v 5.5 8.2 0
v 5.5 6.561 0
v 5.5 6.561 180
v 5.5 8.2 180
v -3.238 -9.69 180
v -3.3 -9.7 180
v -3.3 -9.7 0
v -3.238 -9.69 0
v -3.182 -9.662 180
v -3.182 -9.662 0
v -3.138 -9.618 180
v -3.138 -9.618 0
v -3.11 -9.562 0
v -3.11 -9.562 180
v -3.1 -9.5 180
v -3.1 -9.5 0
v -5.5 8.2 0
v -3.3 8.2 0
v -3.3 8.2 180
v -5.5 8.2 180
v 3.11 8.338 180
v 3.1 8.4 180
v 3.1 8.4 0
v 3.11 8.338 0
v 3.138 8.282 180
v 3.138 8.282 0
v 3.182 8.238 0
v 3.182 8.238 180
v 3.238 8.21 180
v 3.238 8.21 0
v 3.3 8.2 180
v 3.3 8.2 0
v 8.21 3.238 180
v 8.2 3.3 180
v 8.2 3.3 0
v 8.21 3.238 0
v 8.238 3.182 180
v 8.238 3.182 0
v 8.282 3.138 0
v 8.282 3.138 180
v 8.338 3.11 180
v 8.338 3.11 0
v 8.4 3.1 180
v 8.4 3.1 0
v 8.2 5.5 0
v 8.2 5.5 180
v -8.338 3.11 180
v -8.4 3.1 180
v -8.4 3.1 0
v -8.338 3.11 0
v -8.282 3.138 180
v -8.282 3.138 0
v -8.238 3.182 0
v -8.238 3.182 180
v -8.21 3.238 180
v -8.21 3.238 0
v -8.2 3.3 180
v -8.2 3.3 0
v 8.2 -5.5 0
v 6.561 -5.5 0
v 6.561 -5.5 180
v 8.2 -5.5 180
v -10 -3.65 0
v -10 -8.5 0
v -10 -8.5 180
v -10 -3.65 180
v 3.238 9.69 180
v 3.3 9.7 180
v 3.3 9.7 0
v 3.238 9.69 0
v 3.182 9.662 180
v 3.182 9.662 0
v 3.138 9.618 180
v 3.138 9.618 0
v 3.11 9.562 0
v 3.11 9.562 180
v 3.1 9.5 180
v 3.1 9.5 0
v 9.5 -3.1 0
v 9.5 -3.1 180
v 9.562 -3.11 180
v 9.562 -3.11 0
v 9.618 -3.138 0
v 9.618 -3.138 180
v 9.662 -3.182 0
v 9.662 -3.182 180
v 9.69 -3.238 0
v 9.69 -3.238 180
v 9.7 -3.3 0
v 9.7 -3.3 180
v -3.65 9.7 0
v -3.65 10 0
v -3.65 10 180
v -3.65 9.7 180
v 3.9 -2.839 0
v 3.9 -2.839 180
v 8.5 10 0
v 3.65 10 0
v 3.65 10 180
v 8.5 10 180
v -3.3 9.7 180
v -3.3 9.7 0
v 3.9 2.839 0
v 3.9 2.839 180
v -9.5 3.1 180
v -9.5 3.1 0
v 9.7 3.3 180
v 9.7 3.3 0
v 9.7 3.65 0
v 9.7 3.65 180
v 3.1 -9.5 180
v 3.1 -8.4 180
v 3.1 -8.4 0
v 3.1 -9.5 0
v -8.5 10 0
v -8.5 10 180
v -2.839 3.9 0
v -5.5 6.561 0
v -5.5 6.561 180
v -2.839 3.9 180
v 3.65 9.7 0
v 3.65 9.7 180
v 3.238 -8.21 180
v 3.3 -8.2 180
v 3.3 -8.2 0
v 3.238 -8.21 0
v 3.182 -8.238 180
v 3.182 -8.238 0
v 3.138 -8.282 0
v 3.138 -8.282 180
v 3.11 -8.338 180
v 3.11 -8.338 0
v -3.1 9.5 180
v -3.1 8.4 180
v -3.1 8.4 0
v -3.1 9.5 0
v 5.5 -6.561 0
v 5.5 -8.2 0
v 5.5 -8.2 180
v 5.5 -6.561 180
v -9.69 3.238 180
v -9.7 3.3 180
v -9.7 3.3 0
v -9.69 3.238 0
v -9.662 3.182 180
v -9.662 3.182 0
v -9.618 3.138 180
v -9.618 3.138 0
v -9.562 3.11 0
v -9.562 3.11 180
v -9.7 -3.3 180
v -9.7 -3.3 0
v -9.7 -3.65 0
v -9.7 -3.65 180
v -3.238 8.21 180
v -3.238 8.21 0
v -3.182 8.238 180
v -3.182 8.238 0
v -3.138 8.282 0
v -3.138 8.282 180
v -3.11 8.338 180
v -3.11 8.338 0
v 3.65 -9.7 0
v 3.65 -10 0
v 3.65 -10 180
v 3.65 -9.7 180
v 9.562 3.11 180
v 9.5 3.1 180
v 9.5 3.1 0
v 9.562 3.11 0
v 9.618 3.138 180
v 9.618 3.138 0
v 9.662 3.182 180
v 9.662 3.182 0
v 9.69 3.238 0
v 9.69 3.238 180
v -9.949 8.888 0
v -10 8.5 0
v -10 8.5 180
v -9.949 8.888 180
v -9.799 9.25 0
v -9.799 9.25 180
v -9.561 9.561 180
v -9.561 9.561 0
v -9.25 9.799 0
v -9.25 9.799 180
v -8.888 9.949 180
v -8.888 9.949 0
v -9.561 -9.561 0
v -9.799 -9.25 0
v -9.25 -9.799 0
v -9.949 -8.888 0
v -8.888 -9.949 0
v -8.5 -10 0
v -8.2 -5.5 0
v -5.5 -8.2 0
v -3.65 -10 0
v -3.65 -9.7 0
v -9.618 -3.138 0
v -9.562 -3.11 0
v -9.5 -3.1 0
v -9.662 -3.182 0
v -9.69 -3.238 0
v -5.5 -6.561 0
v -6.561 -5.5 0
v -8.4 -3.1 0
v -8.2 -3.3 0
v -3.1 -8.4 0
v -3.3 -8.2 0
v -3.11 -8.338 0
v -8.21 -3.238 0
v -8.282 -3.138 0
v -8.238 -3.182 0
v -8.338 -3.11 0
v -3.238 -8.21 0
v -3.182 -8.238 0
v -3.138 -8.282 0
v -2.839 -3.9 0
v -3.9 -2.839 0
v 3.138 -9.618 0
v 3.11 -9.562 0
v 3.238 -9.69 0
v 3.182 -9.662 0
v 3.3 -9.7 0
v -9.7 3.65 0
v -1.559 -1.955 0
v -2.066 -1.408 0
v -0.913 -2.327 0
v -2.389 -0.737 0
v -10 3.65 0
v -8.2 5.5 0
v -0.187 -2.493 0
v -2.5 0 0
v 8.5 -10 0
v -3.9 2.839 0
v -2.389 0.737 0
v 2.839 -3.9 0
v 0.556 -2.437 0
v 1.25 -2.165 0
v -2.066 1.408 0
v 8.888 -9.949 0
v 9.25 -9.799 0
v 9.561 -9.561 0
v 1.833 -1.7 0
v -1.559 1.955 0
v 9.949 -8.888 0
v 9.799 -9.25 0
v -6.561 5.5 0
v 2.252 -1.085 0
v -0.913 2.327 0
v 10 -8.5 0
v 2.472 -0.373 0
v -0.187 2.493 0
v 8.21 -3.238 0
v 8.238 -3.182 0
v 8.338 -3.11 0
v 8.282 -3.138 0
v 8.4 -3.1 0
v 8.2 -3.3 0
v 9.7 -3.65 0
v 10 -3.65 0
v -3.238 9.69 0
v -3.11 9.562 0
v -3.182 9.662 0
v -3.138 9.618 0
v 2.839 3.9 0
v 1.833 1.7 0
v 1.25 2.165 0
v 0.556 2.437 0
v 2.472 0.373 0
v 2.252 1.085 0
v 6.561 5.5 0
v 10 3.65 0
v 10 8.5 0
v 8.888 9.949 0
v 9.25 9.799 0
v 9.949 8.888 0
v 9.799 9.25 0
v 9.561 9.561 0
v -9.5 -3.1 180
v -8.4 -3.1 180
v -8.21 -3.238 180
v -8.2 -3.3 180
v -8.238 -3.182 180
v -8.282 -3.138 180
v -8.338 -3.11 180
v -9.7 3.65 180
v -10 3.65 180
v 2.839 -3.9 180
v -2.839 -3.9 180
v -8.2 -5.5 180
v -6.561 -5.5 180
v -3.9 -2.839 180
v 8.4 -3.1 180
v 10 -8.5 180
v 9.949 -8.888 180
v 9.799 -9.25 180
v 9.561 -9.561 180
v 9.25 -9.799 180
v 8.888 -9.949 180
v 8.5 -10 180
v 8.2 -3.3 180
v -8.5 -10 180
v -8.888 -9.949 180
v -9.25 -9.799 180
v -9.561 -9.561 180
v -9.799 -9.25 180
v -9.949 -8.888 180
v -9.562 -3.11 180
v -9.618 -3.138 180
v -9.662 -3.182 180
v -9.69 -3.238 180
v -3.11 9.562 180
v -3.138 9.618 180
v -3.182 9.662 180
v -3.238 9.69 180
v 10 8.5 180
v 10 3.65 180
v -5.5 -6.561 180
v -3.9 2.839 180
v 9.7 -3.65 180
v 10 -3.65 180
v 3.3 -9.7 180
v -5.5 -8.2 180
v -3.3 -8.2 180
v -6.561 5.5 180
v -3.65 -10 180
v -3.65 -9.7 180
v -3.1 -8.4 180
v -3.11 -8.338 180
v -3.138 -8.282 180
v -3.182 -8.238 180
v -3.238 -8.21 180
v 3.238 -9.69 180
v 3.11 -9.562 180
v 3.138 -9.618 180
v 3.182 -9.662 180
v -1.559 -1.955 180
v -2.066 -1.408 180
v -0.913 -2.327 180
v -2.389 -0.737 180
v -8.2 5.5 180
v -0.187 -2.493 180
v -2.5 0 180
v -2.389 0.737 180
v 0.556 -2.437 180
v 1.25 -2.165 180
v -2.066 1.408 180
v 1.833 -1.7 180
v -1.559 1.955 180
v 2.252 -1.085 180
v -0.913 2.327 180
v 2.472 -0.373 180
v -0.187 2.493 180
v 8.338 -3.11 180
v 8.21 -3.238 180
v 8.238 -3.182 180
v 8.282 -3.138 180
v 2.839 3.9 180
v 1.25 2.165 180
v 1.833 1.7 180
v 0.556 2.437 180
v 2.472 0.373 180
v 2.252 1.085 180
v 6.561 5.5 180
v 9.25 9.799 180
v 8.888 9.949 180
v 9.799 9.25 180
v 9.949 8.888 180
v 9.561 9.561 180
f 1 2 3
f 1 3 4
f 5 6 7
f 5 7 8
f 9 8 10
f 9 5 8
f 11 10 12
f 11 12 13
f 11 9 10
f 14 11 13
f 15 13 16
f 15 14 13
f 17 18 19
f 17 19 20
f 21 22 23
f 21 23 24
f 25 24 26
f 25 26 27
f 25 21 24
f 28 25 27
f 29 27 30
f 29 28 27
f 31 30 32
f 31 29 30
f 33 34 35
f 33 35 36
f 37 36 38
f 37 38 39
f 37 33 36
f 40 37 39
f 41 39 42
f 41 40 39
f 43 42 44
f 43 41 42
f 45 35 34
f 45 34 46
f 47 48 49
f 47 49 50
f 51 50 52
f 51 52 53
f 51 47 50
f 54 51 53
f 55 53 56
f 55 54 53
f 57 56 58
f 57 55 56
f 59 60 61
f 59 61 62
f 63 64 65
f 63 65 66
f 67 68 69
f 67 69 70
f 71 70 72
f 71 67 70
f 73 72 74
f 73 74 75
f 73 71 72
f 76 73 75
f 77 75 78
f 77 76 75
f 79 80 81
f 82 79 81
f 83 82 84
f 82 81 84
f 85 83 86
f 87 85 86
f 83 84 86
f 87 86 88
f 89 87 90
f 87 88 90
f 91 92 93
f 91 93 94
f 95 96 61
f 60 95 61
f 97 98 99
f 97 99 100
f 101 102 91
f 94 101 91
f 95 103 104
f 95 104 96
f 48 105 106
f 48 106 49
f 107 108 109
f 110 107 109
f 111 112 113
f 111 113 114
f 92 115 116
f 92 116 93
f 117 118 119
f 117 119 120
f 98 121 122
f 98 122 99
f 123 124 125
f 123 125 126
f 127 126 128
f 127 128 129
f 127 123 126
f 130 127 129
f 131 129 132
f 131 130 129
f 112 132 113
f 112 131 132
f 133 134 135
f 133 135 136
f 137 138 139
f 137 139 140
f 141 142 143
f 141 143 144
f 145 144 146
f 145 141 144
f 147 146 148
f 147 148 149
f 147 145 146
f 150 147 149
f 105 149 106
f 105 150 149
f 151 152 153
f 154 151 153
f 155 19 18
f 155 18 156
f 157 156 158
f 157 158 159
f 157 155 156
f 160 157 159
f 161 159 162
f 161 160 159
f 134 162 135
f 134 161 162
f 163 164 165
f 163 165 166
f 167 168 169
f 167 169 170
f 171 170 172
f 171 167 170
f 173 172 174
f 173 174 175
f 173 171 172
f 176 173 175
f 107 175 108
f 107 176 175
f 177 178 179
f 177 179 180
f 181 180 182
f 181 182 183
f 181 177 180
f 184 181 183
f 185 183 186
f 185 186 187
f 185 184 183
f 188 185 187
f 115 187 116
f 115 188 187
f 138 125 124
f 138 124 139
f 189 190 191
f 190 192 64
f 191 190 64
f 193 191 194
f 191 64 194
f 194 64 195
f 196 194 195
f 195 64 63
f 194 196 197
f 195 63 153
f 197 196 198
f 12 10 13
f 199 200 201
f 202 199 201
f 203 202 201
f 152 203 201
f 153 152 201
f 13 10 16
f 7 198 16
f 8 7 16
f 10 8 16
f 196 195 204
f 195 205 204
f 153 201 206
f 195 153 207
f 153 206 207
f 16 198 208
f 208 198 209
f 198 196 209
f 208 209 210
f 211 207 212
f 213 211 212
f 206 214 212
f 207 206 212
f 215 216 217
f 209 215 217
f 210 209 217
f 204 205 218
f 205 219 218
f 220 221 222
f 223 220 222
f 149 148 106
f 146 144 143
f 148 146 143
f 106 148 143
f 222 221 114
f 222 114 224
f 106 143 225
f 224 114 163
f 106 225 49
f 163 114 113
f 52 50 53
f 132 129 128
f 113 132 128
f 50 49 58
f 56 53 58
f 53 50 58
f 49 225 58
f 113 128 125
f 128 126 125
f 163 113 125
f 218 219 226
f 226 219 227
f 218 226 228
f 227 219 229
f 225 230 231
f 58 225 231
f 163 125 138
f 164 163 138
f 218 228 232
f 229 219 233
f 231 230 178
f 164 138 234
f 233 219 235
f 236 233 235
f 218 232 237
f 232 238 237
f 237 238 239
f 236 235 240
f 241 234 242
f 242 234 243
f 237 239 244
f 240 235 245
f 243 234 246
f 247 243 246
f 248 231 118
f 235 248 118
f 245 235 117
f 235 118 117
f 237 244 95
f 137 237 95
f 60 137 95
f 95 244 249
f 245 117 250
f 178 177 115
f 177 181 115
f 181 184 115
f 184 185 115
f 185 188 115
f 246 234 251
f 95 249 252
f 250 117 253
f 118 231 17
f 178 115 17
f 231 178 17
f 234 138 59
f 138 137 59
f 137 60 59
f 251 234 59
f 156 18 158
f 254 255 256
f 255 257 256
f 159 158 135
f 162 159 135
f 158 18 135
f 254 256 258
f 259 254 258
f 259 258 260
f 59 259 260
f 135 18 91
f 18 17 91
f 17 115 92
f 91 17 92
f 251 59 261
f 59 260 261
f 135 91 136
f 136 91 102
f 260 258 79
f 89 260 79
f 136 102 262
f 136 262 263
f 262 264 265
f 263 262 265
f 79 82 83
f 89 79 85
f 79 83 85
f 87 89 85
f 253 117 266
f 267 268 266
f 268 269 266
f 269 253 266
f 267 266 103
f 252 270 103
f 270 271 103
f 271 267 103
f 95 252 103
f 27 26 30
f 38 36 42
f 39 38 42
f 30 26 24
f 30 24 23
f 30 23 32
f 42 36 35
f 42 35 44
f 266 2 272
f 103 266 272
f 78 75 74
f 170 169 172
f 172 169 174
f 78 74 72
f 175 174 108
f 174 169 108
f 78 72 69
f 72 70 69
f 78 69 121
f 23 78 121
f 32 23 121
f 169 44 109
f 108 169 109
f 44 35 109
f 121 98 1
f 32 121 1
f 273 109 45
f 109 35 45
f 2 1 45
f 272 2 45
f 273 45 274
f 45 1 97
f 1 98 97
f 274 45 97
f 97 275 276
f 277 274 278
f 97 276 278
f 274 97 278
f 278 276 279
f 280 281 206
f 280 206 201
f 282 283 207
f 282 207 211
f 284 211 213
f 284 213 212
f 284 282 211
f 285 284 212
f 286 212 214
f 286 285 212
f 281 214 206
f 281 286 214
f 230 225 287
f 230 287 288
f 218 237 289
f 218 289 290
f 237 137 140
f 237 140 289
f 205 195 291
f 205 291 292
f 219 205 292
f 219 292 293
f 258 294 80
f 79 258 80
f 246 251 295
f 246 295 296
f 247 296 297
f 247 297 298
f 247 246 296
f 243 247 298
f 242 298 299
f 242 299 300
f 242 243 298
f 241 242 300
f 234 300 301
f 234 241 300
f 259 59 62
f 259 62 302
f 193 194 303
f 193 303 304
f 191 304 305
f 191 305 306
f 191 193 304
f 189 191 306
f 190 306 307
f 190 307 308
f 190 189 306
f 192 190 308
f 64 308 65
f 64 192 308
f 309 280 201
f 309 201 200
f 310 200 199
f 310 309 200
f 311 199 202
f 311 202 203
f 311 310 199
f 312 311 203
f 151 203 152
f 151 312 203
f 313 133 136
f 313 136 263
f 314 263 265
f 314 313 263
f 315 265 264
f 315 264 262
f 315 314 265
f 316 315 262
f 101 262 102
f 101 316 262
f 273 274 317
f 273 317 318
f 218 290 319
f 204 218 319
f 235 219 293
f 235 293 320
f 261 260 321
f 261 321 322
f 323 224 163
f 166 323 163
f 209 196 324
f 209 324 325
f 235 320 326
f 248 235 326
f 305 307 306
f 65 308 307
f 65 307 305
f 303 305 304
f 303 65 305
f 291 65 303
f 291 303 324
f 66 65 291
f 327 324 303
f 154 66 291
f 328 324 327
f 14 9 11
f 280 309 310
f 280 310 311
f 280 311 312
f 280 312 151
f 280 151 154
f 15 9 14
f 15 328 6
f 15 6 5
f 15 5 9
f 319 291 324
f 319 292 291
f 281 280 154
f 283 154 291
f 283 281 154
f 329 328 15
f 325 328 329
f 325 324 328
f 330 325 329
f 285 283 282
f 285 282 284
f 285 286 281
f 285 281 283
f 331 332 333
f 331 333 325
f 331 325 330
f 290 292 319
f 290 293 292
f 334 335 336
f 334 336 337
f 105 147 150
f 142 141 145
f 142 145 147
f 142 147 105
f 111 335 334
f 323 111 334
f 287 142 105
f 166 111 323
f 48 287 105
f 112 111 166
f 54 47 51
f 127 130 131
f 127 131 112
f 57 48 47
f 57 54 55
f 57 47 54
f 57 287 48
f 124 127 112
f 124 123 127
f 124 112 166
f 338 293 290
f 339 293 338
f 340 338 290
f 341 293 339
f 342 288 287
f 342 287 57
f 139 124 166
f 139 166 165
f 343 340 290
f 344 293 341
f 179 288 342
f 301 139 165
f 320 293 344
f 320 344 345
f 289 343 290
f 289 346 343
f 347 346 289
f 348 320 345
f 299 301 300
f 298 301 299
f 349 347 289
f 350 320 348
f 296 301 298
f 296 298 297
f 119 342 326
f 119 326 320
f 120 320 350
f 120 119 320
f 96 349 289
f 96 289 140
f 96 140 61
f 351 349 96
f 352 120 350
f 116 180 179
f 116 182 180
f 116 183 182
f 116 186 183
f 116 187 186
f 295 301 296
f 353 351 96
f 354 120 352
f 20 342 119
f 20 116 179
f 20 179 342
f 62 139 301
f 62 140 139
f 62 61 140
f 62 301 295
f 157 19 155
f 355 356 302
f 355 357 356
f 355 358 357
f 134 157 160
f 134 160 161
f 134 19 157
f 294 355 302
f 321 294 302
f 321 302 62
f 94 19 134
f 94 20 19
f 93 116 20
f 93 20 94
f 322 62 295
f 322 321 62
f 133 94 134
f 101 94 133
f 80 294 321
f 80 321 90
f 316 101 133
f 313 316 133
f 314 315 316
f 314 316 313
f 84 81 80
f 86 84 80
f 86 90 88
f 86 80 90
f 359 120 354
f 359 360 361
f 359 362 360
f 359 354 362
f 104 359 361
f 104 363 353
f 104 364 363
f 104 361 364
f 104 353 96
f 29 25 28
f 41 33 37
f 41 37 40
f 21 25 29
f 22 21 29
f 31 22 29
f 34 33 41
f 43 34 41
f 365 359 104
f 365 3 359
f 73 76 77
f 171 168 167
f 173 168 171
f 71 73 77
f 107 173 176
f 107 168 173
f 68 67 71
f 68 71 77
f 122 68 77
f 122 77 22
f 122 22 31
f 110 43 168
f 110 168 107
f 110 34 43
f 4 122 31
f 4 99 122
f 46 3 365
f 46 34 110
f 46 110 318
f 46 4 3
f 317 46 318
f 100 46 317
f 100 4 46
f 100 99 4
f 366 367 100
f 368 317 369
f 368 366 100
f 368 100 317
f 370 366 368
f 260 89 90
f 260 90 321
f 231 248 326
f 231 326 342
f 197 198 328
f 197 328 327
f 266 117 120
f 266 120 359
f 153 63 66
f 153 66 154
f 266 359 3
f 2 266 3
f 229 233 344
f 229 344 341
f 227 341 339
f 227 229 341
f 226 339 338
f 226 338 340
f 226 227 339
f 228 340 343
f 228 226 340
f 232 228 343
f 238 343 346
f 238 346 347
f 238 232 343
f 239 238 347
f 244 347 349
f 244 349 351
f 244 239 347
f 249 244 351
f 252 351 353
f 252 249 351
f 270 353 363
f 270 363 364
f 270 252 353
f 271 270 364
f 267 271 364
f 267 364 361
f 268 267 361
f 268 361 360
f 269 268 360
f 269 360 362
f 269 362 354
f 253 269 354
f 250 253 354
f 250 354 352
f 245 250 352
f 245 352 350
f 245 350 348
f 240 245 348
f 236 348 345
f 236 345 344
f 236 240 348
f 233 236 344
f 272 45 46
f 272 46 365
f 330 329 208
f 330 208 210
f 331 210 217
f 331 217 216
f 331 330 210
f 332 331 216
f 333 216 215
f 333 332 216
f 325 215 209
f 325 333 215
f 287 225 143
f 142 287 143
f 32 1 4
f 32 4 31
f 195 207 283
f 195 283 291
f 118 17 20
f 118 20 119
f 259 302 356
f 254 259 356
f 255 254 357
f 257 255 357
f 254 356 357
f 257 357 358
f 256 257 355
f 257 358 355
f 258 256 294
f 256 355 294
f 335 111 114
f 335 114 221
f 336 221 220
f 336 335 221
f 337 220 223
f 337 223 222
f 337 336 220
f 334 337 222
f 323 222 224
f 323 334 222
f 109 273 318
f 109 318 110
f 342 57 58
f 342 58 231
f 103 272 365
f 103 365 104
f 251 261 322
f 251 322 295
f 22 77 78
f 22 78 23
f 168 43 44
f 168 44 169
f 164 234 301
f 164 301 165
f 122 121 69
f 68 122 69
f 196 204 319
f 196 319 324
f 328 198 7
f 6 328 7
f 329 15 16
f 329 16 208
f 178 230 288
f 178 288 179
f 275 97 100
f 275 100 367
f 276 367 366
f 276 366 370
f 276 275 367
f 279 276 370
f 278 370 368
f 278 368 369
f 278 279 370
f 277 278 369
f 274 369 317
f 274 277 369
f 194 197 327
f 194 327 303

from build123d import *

# Parameters (mm, degrees)
SKETCH_1_R      = 2.5
EXTRUDE_2_DEPTH = 180
EXTRUDE_3_DEPTH = 180


with BuildPart() as part:
    # 草图1 → 凸台-拉伸2 (new body)
    with BuildSketch(Plane.XY):
        with BuildLine():
            Line((3.65, 10), (8.5, 10))
            ThreePointArc((8.5, 10), (9.560660172, 9.560660172), (10, 8.5))
            Line((10, 8.5), (10, 3.65))
            Line((10, 3.65), (8.2, 3.65))
            Line((8.2, 3.65), (8.2, 5.5))
            Line((8.2, 5.5), (6.560660172, 5.5))
            Line((6.560660172, 5.5), (3.9, 2.839339828))
            Line((3.9, 2.839339828), (3.9, -2.839339828))
            Line((3.9, -2.839339828), (6.560660172, -5.5))
            Line((6.560660172, -5.5), (8.2, -5.5))
            Line((8.2, -5.5), (8.2, -3.65))
            Line((8.2, -3.65), (10, -3.65))
            Line((10, -3.65), (10, -8.5))
            ThreePointArc((10, -8.5), (9.560660172, -9.560660172), (8.5, -10))
            Line((8.5, -10), (3.65, -10))
            Line((3.65, -10), (3.65, -8.2))
            Line((3.65, -8.2), (5.5, -8.2))
            Line((5.5, -8.2), (5.5, -6.560660172))
            Line((5.5, -6.560660172), (2.839339828, -3.9))
            Line((2.839339828, -3.9), (-2.839339828, -3.9))
            Line((-2.839339828, -3.9), (-5.5, -6.560660172))
            Line((-5.5, -6.560660172), (-5.5, -8.2))
            Line((-5.5, -8.2), (-3.65, -8.2))
            Line((-3.65, -8.2), (-3.65, -10))
            Line((-3.65, -10), (-8.5, -10))
            ThreePointArc((-8.5, -10), (-9.560660172, -9.560660172), (-10, -8.5))
            Line((-10, -8.5), (-10, -3.65))
            Line((-10, -3.65), (-8.2, -3.65))
            Line((-8.2, -3.65), (-8.2, -5.5))
            Line((-8.2, -5.5), (-6.560660172, -5.5))
            Line((-6.560660172, -5.5), (-3.9, -2.839339828))
            Line((-3.9, -2.839339828), (-3.9, 2.839339828))
            Line((-3.9, 2.839339828), (-6.560660172, 5.5))
            Line((-6.560660172, 5.5), (-8.2, 5.5))
            Line((-8.2, 5.5), (-8.2, 3.65))
            Line((-8.2, 3.65), (-10, 3.65))
            Line((-10, 3.65), (-10, 8.5))
            ThreePointArc((-10, 8.5), (-9.560660172, 9.560660172), (-8.5, 10))
            Line((-8.5, 10), (-3.65, 10))
            Line((-3.65, 10), (-3.65, 8.2))
            Line((-3.65, 8.2), (-5.5, 8.2))
            Line((-5.5, 8.2), (-5.5, 6.560660172))
            Line((-5.5, 6.560660172), (-2.839339828, 3.9))
            Line((-2.839339828, 3.9), (2.839339828, 3.9))
            Line((2.839339828, 3.9), (5.5, 6.560660172))
            Line((5.5, 6.560660172), (5.5, 8.2))
            Line((5.5, 8.2), (3.65, 8.2))
            Line((3.65, 8.2), (3.65, 10))
        make_face()
        with Locations(Location((0, 0, 0), (0, 0, 180))):
            Circle(SKETCH_1_R, mode=Mode.SUBTRACT)
    extrude(amount=EXTRUDE_2_DEPTH)

    # 草图3 → 凸台-拉伸3 (add)
    with BuildSketch(Plane.XY.offset(180)):
        with BuildLine():
            Line((-8.2, 3.65), (-9.7, 3.65))
            Line((-9.7, 3.65), (-9.7, 3.3))
            ThreePointArc((-9.7, 3.3), (-9.641421356, 3.158578644), (-9.5, 3.1))
            Line((-9.5, 3.1), (-8.4, 3.1))
            ThreePointArc((-8.4, 3.1), (-8.258578644, 3.158578644), (-8.2, 3.3))
            Line((-8.2, 3.3), (-8.2, 3.65))
        make_face()
        with BuildLine():
            Line((-3.65, 9.7), (-3.65, 8.2))
            Line((-3.65, 8.2), (-3.3, 8.2))
            ThreePointArc((-3.3, 8.2), (-3.158578644, 8.258578644), (-3.1, 8.4))
            Line((-3.1, 8.4), (-3.1, 9.5))
            ThreePointArc((-3.1, 9.5), (-3.158578644, 9.641421356), (-3.3, 9.7))
            Line((-3.3, 9.7), (-3.65, 9.7))
        make_face()
        with BuildLine():
            Line((3.65, 8.2), (3.65, 9.7))
            Line((3.65, 9.7), (3.3, 9.7))
            ThreePointArc((3.3, 9.7), (3.158578644, 9.641421356), (3.1, 9.5))
            Line((3.1, 9.5), (3.1, 8.4))
            ThreePointArc((3.1, 8.4), (3.158578644, 8.258578644), (3.3, 8.2))
            Line((3.3, 8.2), (3.65, 8.2))
        make_face()
        with BuildLine():
            Line((9.7, 3.65), (8.2, 3.65))
            Line((8.2, 3.65), (8.2, 3.3))
            ThreePointArc((8.2, 3.3), (8.258578644, 3.158578644), (8.4, 3.1))
            Line((8.4, 3.1), (9.5, 3.1))
            ThreePointArc((9.5, 3.1), (9.641421356, 3.158578644), (9.7, 3.3))
            Line((9.7, 3.3), (9.7, 3.65))
        make_face()
        with BuildLine():
            Line((3.65, -9.7), (3.65, -8.2))
            Line((3.65, -8.2), (3.3, -8.2))
            ThreePointArc((3.3, -8.2), (3.158578644, -8.258578644), (3.1, -8.4))
            Line((3.1, -8.4), (3.1, -9.5))
            ThreePointArc((3.1, -9.5), (3.158578644, -9.641421356), (3.3, -9.7))
            Line((3.3, -9.7), (3.65, -9.7))
        make_face()
        with BuildLine():
            Line((-3.65, -8.2), (-3.65, -9.7))
            Line((-3.65, -9.7), (-3.3, -9.7))
            ThreePointArc((-3.3, -9.7), (-3.158578644, -9.641421356), (-3.1, -9.5))
            Line((-3.1, -9.5), (-3.1, -8.4))
            ThreePointArc((-3.1, -8.4), (-3.158578644, -8.258578644), (-3.3, -8.2))
            Line((-3.3, -8.2), (-3.65, -8.2))
        make_face()
        with BuildLine():
            Line((8.2, -3.65), (8.2, -3.3))
            ThreePointArc((8.2, -3.3), (8.258578644, -3.158578644), (8.4, -3.1))
            Line((8.4, -3.1), (9.5, -3.1))
            ThreePointArc((9.5, -3.1), (9.641421356, -3.158578644), (9.7, -3.3))
            Line((9.7, -3.3), (9.7, -3.65))
            Line((9.7, -3.65), (8.2, -3.65))
        make_face()
        with BuildLine():
            Line((-8.2, -3.65), (-8.2, -3.3))
            ThreePointArc((-8.2, -3.3), (-8.258578644, -3.158578644), (-8.4, -3.1))
            Line((-8.4, -3.1), (-9.5, -3.1))
            ThreePointArc((-9.5, -3.1), (-9.641421356, -3.158578644), (-9.7, -3.3))
            Line((-9.7, -3.3), (-9.7, -3.65))
            Line((-9.7, -3.65), (-8.2, -3.65))
        make_face()
    extrude(amount=-EXTRUDE_3_DEPTH)


solid = part.part
